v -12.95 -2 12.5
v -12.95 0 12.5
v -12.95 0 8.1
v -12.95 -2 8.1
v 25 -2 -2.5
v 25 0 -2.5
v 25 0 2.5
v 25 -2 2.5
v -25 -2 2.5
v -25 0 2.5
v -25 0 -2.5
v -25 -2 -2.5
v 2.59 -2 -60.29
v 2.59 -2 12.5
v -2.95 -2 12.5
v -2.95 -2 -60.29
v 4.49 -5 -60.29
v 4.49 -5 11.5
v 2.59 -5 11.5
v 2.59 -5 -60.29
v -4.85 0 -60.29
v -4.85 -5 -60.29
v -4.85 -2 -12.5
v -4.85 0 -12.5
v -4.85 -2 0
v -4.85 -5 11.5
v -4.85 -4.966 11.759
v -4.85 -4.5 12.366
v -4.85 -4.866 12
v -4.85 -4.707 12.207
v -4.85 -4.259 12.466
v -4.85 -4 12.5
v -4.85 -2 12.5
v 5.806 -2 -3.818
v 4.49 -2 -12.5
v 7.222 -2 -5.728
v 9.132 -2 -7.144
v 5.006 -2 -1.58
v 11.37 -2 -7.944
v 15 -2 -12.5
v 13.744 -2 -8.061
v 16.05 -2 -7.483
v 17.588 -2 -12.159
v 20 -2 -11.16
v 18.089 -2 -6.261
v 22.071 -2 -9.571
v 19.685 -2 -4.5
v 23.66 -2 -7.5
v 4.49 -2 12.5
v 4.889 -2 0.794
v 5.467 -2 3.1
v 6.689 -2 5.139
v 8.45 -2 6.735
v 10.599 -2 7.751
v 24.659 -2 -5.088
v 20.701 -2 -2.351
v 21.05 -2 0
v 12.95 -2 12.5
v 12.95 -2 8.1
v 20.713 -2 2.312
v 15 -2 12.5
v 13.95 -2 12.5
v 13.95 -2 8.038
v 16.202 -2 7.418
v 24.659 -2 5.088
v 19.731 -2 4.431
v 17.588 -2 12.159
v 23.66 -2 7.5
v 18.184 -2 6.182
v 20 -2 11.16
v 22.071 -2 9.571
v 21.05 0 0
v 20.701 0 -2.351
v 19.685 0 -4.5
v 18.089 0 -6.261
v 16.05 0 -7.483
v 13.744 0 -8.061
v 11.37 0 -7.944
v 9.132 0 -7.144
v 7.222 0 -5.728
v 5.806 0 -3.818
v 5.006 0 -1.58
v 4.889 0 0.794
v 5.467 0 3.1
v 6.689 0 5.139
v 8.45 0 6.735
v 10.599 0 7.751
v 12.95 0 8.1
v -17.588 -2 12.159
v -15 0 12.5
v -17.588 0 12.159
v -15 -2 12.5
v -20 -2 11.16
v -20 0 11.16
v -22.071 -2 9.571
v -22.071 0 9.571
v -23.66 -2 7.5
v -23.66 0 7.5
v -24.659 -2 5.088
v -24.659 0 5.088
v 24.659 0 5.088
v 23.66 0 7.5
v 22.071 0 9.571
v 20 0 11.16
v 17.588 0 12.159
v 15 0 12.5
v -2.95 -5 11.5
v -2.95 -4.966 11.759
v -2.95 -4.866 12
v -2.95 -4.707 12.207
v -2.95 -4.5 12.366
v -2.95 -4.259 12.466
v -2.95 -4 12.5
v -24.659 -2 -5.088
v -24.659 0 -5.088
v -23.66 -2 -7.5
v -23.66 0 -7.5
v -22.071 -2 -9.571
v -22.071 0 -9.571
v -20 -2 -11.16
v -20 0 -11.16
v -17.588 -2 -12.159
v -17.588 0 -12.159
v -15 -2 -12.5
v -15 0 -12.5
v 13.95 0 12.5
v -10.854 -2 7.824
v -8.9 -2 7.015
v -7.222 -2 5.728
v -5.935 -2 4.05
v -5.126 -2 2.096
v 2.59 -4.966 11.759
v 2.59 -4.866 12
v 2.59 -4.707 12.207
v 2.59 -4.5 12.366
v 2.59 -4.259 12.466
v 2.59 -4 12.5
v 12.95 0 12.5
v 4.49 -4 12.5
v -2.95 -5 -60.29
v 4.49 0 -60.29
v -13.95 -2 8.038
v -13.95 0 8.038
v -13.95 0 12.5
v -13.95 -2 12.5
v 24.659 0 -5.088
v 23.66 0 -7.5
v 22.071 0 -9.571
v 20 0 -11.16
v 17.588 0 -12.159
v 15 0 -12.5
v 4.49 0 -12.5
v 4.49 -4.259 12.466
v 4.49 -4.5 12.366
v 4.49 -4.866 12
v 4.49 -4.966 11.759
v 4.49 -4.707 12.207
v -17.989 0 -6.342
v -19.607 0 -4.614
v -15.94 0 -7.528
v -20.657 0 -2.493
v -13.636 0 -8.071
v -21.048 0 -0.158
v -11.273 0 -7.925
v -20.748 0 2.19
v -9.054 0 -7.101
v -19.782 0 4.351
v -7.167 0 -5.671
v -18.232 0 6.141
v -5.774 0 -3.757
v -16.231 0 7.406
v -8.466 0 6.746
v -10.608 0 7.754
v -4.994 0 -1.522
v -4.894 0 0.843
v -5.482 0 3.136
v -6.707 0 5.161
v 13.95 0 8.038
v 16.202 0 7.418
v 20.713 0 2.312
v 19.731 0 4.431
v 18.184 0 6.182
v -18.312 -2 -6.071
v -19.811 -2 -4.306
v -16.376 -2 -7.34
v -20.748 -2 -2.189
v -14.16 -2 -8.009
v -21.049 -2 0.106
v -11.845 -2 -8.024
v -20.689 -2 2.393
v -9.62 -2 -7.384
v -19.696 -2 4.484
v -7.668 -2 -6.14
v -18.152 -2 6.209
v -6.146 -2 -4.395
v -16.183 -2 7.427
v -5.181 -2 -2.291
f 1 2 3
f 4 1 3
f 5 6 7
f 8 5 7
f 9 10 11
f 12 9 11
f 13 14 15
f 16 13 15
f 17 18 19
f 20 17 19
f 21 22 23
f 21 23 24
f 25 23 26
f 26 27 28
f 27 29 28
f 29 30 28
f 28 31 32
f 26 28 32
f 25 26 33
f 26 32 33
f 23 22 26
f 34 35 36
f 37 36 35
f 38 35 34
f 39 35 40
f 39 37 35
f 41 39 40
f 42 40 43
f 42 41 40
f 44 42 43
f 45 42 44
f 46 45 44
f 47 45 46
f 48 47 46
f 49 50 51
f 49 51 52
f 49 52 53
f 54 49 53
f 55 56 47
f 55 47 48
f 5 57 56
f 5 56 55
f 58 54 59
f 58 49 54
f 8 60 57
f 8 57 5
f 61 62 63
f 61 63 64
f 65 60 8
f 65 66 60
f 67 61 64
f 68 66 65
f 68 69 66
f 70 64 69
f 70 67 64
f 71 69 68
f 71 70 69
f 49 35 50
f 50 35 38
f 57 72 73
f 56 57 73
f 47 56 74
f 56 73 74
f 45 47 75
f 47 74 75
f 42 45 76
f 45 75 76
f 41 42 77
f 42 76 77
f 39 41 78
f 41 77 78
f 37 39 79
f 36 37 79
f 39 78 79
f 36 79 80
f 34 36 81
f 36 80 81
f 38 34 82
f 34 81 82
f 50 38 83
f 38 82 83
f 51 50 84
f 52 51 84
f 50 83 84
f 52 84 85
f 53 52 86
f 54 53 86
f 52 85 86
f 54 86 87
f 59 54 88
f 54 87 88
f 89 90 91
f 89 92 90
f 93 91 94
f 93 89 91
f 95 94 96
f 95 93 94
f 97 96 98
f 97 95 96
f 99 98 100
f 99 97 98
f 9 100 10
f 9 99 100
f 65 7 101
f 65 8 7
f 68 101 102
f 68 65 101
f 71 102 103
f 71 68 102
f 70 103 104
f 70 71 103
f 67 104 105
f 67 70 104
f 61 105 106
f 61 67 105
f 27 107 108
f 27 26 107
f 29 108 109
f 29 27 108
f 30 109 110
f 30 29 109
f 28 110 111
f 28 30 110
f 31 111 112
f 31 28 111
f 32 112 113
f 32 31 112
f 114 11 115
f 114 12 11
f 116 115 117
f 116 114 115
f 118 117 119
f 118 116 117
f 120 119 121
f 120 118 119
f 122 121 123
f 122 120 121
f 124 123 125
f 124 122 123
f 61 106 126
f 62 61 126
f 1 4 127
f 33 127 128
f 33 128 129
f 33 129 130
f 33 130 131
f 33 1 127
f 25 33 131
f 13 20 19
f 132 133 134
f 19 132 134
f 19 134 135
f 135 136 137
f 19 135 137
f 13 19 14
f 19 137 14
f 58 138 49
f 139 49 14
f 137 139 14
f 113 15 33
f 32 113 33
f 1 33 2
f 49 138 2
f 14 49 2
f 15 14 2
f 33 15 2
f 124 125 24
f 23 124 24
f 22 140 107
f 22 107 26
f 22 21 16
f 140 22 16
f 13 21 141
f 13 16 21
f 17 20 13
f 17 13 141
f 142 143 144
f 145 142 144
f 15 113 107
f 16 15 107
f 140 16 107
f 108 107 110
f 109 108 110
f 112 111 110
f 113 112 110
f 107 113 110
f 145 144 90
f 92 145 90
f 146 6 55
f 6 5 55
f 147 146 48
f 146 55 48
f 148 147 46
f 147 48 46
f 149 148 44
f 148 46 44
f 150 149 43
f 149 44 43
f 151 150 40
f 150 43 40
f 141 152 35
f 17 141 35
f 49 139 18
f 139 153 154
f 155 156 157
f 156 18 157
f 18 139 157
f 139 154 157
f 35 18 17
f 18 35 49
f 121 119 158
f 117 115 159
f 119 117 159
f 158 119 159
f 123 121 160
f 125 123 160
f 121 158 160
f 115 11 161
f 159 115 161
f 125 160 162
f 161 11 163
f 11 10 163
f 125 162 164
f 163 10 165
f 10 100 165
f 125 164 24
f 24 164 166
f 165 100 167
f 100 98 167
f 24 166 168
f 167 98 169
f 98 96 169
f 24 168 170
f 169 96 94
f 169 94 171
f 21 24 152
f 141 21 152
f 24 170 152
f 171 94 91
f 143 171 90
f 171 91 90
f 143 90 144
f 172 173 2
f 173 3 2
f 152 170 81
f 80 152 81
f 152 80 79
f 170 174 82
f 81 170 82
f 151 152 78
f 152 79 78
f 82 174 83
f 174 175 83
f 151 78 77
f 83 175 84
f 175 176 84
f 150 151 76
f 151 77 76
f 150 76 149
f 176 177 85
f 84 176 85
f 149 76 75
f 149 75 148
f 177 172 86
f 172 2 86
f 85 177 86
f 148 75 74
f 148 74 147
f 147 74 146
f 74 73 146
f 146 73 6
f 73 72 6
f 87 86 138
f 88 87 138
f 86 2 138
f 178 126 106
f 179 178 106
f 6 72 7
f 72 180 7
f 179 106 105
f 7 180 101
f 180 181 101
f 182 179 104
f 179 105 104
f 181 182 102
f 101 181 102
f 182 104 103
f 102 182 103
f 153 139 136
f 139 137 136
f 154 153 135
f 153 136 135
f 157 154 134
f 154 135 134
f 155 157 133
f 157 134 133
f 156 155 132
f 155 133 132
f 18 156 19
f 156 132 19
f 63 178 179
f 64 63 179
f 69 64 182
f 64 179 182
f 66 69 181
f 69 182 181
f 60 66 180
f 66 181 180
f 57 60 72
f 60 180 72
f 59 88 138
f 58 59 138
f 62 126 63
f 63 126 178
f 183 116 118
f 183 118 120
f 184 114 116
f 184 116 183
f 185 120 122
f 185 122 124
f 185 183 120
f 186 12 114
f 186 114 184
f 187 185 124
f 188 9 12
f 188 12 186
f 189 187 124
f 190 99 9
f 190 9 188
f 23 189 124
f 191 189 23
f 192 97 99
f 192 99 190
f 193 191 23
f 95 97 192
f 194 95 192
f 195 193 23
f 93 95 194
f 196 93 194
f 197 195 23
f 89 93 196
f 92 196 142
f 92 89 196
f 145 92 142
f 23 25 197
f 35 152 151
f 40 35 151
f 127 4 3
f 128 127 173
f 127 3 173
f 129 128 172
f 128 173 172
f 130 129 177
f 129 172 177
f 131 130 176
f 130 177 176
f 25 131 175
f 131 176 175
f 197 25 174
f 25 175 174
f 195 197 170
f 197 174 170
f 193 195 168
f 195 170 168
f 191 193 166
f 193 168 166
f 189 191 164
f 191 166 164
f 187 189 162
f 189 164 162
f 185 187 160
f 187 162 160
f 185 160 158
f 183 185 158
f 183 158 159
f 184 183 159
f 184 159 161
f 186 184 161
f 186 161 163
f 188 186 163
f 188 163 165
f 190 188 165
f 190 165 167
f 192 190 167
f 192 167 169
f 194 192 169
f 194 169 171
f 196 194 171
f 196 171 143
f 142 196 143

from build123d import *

# Parameters (mm, degrees)
F0_W     = 5.54
F0_H     = 25
F1_DEPTH = 2
F2_R     = 10
F3_DEPTH = 5
F5_DEPTH = 47.79
F6_R     = 1


# Not quite as in the source:
# - a feature of the source that left no trace in its solid (it failed there, or was rolled back) is left out


with BuildPart() as f1:
    # F0 (on Front) → F1 (new body)
    with BuildSketch(Plane.XZ):
        with BuildLine():
            Line((4.49, -12.5), (25, -12.5))
            Line((25, -12.5), (25, 12.5))
            Line((25, 12.5), (13.95, 12.5))
            Line((13.95, 12.5), (13.95, 8.0380345856))
            ThreePointArc((13.95, 8.0380345856), (19.0208319035, 5.3623688795), (21.05, 0))
            ThreePointArc((21.05, 0), (7.2224350724, -5.7275649276), (12.95, 8.1))
            Line((12.95, 8.1), (12.95, 12.5))
            Line((12.95, 12.5), (4.49, 12.5))
            Line((4.49, 12.5), (4.49, 0))
            Line((4.49, 0), (4.49, -12.5))
        make_face()
        with BuildLine():
            ThreePointArc((-12.95, 8.1), (-7.2224350724, 5.7275649276), (-4.85, 0))
            Line((-4.85, 0), (-4.85, 12.5))
            Line((-4.85, 12.5), (-12.95, 12.5))
            Line((-12.95, 12.5), (-12.95, 8.1))
        make_face()
        with BuildLine():
            Line((-25, -12.5), (-4.85, -12.5))
            Line((-4.85, -12.5), (-4.85, 0))
            ThreePointArc((-4.85, 0), (-18.3123688795, -6.0708319035), (-13.95, 8.0380345856))
            Line((-13.95, 8.0380345856), (-13.95, 12.5))
            Line((-13.95, 12.5), (-25, 12.5))
            Line((-25, 12.5), (-25, -12.5))
        make_face()
        Polygon((-4.85, -12.5), (-2.95, -12.5), (-2.95, 12.5), (-4.85, 12.5), (-4.85, 0), align=None)
        with Locations((-0.18, 0)):
            Rectangle(F0_W, F0_H)
        Polygon((2.59, -12.5), (4.49, -12.5), (4.49, 0), (4.49, 12.5), (2.59, 12.5), align=None)
    extrude(amount=F1_DEPTH)

    # F2
    f2_edges = [f1.edges().sort_by_distance(p)[0] for p in [
        (25, -1, -12.5),
        (25, -1, 12.5),
        (-25, -1, 12.5),
        (-25, -1, -12.5),
    ]]
    fillet(f2_edges, radius=F2_R)

    # F0 (on Front) → F3 (join)
    with BuildSketch(Plane.XZ):
        Polygon((2.59, -12.5), (4.49, -12.5), (4.49, 0), (4.49, 12.5), (2.59, 12.5), align=None)
        Polygon((-4.85, -12.5), (-2.95, -12.5), (-2.95, 12.5), (-4.85, 12.5), (-4.85, 0), align=None)
    extrude(amount=F3_DEPTH)

    # F4 (on face) → F5 (join)
    with BuildSketch(Plane(origin=(0, 0, -12.5), x_dir=(1, 0, 0), z_dir=(0, 0, -1))):
        Polygon((-2.95, 5), (-4.85, 5), (-4.85, 0), (4.49, 0), (4.49, 2), (4.49, 5), (2.59, 5), (2.59, 2), (-2.95, 2), align=None)
    extrude(amount=F5_DEPTH)

    # F6
    f6_edges = [f1.edges().sort_by_distance(p)[0] for p in [
        (-3.9, -5, 12.5),
        (3.54, -5, 12.5),
    ]]
    fillet(f6_edges, radius=F6_R)


solid = f1.part
